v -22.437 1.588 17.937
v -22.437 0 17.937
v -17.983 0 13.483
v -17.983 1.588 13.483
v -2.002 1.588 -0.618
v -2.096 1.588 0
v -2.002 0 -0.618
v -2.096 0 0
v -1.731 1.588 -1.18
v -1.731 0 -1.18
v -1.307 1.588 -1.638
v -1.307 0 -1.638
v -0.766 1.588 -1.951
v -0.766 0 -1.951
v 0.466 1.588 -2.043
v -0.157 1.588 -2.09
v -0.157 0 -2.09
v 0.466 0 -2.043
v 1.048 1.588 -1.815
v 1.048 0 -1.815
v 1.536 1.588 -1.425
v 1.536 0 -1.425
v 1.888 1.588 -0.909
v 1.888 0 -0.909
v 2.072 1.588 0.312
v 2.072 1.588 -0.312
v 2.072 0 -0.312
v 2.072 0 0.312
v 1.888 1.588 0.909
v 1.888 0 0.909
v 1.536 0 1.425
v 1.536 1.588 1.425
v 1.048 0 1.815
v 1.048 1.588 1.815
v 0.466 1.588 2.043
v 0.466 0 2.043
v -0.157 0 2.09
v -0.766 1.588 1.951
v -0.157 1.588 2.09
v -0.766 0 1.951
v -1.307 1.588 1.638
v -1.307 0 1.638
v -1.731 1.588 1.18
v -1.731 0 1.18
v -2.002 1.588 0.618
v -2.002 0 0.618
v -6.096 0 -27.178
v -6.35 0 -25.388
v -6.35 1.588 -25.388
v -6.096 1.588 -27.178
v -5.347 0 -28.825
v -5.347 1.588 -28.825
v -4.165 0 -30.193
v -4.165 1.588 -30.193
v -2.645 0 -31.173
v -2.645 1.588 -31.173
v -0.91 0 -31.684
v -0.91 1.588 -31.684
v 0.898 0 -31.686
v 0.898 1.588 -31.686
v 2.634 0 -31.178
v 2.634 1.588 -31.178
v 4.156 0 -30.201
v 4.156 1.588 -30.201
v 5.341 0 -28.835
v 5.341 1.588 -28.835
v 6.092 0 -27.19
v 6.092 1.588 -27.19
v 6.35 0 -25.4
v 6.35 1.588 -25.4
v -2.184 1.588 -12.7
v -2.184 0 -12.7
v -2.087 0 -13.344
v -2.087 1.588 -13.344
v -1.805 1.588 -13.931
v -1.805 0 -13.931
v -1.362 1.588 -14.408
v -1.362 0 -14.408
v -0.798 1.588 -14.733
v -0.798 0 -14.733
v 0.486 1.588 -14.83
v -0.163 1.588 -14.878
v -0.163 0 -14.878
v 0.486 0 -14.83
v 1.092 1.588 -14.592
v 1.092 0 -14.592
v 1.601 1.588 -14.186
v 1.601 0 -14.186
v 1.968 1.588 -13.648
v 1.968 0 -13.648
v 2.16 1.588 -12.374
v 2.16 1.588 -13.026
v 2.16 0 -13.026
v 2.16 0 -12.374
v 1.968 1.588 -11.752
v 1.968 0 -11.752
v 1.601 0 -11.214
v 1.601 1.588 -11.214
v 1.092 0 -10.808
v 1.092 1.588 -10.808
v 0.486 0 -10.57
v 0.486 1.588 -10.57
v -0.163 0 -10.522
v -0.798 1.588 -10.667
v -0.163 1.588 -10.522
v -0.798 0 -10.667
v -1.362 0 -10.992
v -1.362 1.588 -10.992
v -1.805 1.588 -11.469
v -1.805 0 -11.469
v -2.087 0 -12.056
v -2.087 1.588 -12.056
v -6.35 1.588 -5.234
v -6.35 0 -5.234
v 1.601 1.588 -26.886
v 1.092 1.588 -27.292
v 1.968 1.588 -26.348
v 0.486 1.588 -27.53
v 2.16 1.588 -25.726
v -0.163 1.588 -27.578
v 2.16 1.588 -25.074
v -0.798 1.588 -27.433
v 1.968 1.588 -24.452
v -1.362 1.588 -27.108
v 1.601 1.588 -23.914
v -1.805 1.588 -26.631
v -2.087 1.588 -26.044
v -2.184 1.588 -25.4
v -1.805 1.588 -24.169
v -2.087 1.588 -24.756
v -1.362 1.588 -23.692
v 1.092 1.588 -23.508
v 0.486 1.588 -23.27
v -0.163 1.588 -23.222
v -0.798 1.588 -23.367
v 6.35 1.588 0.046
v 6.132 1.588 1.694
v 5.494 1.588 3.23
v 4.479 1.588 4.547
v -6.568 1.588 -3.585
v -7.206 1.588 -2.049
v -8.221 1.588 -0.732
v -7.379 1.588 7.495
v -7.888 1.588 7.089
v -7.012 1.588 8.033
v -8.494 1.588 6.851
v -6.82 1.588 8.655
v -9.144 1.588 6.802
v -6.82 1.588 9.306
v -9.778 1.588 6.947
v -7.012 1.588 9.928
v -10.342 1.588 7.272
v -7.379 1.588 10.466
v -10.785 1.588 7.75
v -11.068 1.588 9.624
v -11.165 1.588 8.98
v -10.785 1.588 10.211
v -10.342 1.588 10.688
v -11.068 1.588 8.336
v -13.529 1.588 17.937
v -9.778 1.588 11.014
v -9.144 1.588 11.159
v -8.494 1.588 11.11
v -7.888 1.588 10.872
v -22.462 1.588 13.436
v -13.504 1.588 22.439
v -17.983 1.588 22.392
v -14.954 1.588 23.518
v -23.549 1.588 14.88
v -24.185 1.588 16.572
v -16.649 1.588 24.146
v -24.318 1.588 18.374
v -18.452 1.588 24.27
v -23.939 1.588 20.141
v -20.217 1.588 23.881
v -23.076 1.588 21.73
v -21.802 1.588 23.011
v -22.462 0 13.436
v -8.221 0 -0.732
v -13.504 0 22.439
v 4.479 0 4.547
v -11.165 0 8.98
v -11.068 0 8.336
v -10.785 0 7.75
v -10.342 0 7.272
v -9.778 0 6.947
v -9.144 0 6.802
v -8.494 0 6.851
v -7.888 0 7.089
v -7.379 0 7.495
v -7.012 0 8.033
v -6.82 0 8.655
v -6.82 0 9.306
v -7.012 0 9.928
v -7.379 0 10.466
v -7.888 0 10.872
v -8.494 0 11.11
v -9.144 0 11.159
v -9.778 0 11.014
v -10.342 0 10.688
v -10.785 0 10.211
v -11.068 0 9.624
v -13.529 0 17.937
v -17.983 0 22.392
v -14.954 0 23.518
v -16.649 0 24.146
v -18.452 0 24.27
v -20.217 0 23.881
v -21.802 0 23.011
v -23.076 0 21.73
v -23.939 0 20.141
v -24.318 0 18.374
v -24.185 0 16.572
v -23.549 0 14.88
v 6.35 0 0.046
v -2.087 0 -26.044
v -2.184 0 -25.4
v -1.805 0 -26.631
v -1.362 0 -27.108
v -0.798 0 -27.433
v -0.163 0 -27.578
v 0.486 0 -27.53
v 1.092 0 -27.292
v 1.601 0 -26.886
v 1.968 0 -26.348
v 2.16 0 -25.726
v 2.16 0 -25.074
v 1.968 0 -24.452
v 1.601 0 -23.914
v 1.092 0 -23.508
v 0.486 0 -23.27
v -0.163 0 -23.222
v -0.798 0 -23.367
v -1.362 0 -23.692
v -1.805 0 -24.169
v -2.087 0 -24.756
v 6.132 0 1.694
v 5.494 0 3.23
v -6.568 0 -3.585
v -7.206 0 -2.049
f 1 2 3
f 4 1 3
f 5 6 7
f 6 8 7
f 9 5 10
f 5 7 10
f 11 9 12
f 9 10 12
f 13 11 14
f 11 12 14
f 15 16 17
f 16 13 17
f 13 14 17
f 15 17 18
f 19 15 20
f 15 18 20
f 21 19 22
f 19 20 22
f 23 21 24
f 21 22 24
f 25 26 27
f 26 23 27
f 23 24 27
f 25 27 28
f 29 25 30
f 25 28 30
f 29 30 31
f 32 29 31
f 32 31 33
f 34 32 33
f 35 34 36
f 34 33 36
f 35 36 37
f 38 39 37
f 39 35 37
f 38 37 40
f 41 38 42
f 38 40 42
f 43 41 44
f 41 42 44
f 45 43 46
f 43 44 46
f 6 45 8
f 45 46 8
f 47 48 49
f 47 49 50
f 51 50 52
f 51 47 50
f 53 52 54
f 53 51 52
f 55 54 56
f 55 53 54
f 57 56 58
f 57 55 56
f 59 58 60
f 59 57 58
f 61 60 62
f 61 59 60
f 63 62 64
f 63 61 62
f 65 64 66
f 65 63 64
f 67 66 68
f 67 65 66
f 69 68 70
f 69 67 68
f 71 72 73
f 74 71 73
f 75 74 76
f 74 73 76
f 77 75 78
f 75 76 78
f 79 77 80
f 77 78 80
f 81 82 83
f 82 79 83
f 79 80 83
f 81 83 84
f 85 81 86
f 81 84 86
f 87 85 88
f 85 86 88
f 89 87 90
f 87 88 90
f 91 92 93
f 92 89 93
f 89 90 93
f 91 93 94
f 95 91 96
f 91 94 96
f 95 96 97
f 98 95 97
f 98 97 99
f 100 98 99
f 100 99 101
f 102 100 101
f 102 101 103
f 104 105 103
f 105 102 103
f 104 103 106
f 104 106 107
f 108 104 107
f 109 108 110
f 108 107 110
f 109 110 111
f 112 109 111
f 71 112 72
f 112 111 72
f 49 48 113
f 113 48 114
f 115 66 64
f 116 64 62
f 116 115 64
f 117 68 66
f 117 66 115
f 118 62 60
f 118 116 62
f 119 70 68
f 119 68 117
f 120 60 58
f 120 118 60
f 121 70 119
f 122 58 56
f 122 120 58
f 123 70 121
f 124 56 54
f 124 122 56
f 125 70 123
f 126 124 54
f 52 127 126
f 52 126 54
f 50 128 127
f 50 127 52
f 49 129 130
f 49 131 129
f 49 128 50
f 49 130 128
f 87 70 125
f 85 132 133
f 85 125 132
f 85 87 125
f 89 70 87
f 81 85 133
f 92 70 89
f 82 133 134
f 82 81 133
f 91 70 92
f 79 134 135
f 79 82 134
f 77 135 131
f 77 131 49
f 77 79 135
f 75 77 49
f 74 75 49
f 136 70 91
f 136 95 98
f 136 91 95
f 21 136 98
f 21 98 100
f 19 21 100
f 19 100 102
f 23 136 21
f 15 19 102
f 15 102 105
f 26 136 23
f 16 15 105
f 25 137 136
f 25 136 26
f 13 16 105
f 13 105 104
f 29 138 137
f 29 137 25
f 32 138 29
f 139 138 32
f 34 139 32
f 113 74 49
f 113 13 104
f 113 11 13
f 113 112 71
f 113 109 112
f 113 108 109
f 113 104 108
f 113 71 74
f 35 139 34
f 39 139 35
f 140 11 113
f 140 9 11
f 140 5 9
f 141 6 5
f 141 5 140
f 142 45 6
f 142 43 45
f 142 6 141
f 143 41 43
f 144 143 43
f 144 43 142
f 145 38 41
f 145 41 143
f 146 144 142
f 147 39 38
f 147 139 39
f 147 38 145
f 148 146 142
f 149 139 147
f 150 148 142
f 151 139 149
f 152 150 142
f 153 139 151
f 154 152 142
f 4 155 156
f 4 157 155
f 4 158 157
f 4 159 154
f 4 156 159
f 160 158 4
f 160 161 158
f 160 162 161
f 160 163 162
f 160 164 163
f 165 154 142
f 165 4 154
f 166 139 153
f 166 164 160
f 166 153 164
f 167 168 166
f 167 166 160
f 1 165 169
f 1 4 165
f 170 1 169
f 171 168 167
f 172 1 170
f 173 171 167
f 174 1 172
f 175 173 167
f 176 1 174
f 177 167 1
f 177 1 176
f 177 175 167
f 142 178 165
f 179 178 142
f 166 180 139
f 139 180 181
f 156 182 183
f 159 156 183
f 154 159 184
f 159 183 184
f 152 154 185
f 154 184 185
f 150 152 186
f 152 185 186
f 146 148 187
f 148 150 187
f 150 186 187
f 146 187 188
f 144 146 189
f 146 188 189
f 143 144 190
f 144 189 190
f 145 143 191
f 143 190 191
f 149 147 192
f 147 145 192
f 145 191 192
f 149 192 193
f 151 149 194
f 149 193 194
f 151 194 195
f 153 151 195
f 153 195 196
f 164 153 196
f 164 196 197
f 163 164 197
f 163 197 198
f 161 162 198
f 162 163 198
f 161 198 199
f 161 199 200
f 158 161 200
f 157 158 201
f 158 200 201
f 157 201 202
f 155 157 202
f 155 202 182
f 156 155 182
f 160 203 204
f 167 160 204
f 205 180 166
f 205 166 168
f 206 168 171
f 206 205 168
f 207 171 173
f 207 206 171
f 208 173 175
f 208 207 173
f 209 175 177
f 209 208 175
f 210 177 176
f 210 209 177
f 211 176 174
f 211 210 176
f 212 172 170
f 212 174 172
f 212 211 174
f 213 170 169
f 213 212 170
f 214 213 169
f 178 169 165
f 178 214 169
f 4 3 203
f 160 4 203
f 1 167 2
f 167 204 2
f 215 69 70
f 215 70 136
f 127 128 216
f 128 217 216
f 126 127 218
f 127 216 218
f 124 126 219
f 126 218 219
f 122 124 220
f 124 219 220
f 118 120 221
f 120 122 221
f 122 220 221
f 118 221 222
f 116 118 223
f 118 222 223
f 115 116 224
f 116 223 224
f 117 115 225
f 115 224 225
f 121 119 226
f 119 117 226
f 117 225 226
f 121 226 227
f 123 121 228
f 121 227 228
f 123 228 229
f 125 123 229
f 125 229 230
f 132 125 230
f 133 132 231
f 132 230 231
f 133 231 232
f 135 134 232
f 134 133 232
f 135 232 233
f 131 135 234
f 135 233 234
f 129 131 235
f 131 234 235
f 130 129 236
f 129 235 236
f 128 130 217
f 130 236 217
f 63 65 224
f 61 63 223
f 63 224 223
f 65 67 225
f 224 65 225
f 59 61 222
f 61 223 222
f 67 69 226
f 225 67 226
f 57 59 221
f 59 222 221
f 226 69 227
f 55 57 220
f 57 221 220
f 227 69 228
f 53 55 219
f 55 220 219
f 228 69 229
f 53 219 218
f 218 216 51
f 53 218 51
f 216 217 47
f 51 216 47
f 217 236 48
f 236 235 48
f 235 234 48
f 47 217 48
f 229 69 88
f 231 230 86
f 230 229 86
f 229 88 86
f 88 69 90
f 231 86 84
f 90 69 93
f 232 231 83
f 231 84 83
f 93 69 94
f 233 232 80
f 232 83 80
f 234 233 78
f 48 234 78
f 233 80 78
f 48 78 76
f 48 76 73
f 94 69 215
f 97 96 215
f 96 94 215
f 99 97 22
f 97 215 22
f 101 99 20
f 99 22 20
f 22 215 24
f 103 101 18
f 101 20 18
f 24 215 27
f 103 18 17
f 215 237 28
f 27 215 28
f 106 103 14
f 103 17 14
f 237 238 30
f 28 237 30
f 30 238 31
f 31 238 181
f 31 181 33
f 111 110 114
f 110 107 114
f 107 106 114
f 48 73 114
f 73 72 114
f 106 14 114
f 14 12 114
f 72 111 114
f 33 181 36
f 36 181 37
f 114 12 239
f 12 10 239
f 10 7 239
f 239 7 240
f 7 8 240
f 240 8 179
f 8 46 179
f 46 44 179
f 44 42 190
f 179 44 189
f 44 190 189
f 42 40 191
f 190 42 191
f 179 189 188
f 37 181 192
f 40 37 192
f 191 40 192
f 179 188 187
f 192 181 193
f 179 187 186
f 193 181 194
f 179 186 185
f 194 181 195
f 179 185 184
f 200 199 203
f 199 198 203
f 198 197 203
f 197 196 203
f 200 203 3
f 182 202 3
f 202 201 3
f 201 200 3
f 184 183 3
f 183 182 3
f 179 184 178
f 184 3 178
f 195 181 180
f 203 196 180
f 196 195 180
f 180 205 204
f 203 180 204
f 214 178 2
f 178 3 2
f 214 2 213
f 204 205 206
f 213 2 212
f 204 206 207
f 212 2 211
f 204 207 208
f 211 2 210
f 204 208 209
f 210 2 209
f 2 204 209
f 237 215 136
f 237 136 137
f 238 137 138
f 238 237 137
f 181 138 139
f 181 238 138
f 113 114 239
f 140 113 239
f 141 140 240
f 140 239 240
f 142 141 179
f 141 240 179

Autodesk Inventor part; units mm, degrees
ref_plane "YZ Plane" through (0, 0, 0) normal (1, 0, 0) x (0, 1, 0)
ref_plane "XZ Plane" through (0, 0, 0) normal (0, 1, 0) x (-1, 0, 0)
ref_plane "XY Plane" through (0, 0, 0) normal (0, 0, 1) x (1, 0, 0)
sketch "main" plane through (0, 0, 0) normal (0, 0, 1) x (1, 0, 0)
  arc A0 (11.6558, 28.6956) -> (2.6985, 37.6987) centre (7.1771, 33.1971) ccw
  circle A1 centre (-10.8061, -10.1403) radius 2.1844
  arc A2 (-17.1561, -10.1402) -> (-4.4561, -10.1282) centre (-10.8061, -10.1403) ccw
  line L0 (2.6985, 37.6987) -> (-15.2847, 19.807)
  circle A3 centre (-1.8258, 24.24) radius 2.1844
  line L1 (11.6558, 28.6956) -> (-2.5847, 14.5275)
  line L2 (-10.8061, 15.2597) -> (27.2939, 15.2597) construction
  circle A4 centre (-10.8061, 2.5597) radius 2.1844
  line L3 (-4.4561, -10.1282) -> (-4.4561, 10.026)
  arc A5 (-2.5847, 14.5275) -> (-4.4561, 10.026) centre (1.8939, 10.026) ccw
  line L4 (-17.1561, -10.1402) -> (-17.1561, 15.3055)
  circle A6 centre (-10.8061, 15.2597) radius 2.0955
  arc A7 (-15.2847, 19.807) -> (-17.1561, 15.3055) centre (-10.8061, 15.3055) ccw
  line L5 (7.1771, 37.6513) -> (11.6313, 33.1971)
  line L6 (11.6313, 33.1971) -> (7.1771, 28.7429)
  line L7 (7.1771, 28.7429) -> (2.7229, 33.1971)
  line L8 (2.7229, 33.1971) -> (7.1771, 37.6513)
  line L9 (7.1771, 37.6513) -> (7.1771, 28.7429) construction
  line L10 (11.6313, 33.1971) -> (2.7229, 33.1971) construction
  line L11 (7.1771, 37.6513) -> (13.4763, 37.6513) construction
  point P0 (0.9467, 22.1756)
  point P1 (5.5442, 34.8331)
  point P2 (8.7899, 34.8537)
  point P3 (5.5158, 31.5901)
  dimension "d0" = 12.7
  dimension "d5" = 12.7
  dimension "d6" = 6.35
  dimension "d9" = 6.2992
  dimension "d10" = 45
  dimension "d11" = 6.2992
sketch "Sketch1" plane through (0, 0, 0) normal (0, 1, 0) x (-1, 0, 0)
  arc A0 (22.4619, 13.4358) -> (13.5045, 22.439) centre (17.9832, 17.9374) ccw
  circle A1 centre (0, -25.4) radius 2.1844
  arc A2 (-6.35, -25.4) -> (6.35, -25.3879) centre (0, -25.4) ccw
  line L0 (13.5045, 22.439) -> (-4.4786, 4.5473)
  circle A3 centre (8.9803, 8.9803) radius 2.1844
  line L1 (22.4619, 13.4358) -> (8.2213, -0.7322)
  line L2 (0, 0) -> (38.1, 0) construction
  circle A4 centre (0, -12.7) radius 2.1844
  line L3 (6.35, -25.3879) -> (6.35, -5.2338)
  arc A5 (8.2213, -0.7322) -> (6.35, -5.2338) centre (12.7, -5.2338) ccw
  line L4 (-6.35, -25.4) -> (-6.35, 0.0457)
  circle A6 centre (0, 0) radius 2.0955
  arc A7 (-4.4786, 4.5473) -> (-6.35, 0.0457) centre (0, 0.0457) ccw
  line L5 (17.9832, 22.3916) -> (22.4374, 17.9374)
  line L6 (22.4374, 17.9374) -> (17.9832, 13.4832)
  line L7 (17.9832, 13.4832) -> (13.529, 17.9374)
  line L8 (13.529, 17.9374) -> (17.9832, 22.3916)
  line L9 (17.9832, 22.3916) -> (17.9832, 13.4832) construction
  line L10 (22.4374, 17.9374) -> (13.529, 17.9374) construction
  line L11 (17.9832, 22.3916) -> (24.2824, 22.3916) construction
extrude "Extrusion1" add sketch "Sketch1" along normal blind 1.5875
properties part number "gusset" material "Acetal Resin, White"
